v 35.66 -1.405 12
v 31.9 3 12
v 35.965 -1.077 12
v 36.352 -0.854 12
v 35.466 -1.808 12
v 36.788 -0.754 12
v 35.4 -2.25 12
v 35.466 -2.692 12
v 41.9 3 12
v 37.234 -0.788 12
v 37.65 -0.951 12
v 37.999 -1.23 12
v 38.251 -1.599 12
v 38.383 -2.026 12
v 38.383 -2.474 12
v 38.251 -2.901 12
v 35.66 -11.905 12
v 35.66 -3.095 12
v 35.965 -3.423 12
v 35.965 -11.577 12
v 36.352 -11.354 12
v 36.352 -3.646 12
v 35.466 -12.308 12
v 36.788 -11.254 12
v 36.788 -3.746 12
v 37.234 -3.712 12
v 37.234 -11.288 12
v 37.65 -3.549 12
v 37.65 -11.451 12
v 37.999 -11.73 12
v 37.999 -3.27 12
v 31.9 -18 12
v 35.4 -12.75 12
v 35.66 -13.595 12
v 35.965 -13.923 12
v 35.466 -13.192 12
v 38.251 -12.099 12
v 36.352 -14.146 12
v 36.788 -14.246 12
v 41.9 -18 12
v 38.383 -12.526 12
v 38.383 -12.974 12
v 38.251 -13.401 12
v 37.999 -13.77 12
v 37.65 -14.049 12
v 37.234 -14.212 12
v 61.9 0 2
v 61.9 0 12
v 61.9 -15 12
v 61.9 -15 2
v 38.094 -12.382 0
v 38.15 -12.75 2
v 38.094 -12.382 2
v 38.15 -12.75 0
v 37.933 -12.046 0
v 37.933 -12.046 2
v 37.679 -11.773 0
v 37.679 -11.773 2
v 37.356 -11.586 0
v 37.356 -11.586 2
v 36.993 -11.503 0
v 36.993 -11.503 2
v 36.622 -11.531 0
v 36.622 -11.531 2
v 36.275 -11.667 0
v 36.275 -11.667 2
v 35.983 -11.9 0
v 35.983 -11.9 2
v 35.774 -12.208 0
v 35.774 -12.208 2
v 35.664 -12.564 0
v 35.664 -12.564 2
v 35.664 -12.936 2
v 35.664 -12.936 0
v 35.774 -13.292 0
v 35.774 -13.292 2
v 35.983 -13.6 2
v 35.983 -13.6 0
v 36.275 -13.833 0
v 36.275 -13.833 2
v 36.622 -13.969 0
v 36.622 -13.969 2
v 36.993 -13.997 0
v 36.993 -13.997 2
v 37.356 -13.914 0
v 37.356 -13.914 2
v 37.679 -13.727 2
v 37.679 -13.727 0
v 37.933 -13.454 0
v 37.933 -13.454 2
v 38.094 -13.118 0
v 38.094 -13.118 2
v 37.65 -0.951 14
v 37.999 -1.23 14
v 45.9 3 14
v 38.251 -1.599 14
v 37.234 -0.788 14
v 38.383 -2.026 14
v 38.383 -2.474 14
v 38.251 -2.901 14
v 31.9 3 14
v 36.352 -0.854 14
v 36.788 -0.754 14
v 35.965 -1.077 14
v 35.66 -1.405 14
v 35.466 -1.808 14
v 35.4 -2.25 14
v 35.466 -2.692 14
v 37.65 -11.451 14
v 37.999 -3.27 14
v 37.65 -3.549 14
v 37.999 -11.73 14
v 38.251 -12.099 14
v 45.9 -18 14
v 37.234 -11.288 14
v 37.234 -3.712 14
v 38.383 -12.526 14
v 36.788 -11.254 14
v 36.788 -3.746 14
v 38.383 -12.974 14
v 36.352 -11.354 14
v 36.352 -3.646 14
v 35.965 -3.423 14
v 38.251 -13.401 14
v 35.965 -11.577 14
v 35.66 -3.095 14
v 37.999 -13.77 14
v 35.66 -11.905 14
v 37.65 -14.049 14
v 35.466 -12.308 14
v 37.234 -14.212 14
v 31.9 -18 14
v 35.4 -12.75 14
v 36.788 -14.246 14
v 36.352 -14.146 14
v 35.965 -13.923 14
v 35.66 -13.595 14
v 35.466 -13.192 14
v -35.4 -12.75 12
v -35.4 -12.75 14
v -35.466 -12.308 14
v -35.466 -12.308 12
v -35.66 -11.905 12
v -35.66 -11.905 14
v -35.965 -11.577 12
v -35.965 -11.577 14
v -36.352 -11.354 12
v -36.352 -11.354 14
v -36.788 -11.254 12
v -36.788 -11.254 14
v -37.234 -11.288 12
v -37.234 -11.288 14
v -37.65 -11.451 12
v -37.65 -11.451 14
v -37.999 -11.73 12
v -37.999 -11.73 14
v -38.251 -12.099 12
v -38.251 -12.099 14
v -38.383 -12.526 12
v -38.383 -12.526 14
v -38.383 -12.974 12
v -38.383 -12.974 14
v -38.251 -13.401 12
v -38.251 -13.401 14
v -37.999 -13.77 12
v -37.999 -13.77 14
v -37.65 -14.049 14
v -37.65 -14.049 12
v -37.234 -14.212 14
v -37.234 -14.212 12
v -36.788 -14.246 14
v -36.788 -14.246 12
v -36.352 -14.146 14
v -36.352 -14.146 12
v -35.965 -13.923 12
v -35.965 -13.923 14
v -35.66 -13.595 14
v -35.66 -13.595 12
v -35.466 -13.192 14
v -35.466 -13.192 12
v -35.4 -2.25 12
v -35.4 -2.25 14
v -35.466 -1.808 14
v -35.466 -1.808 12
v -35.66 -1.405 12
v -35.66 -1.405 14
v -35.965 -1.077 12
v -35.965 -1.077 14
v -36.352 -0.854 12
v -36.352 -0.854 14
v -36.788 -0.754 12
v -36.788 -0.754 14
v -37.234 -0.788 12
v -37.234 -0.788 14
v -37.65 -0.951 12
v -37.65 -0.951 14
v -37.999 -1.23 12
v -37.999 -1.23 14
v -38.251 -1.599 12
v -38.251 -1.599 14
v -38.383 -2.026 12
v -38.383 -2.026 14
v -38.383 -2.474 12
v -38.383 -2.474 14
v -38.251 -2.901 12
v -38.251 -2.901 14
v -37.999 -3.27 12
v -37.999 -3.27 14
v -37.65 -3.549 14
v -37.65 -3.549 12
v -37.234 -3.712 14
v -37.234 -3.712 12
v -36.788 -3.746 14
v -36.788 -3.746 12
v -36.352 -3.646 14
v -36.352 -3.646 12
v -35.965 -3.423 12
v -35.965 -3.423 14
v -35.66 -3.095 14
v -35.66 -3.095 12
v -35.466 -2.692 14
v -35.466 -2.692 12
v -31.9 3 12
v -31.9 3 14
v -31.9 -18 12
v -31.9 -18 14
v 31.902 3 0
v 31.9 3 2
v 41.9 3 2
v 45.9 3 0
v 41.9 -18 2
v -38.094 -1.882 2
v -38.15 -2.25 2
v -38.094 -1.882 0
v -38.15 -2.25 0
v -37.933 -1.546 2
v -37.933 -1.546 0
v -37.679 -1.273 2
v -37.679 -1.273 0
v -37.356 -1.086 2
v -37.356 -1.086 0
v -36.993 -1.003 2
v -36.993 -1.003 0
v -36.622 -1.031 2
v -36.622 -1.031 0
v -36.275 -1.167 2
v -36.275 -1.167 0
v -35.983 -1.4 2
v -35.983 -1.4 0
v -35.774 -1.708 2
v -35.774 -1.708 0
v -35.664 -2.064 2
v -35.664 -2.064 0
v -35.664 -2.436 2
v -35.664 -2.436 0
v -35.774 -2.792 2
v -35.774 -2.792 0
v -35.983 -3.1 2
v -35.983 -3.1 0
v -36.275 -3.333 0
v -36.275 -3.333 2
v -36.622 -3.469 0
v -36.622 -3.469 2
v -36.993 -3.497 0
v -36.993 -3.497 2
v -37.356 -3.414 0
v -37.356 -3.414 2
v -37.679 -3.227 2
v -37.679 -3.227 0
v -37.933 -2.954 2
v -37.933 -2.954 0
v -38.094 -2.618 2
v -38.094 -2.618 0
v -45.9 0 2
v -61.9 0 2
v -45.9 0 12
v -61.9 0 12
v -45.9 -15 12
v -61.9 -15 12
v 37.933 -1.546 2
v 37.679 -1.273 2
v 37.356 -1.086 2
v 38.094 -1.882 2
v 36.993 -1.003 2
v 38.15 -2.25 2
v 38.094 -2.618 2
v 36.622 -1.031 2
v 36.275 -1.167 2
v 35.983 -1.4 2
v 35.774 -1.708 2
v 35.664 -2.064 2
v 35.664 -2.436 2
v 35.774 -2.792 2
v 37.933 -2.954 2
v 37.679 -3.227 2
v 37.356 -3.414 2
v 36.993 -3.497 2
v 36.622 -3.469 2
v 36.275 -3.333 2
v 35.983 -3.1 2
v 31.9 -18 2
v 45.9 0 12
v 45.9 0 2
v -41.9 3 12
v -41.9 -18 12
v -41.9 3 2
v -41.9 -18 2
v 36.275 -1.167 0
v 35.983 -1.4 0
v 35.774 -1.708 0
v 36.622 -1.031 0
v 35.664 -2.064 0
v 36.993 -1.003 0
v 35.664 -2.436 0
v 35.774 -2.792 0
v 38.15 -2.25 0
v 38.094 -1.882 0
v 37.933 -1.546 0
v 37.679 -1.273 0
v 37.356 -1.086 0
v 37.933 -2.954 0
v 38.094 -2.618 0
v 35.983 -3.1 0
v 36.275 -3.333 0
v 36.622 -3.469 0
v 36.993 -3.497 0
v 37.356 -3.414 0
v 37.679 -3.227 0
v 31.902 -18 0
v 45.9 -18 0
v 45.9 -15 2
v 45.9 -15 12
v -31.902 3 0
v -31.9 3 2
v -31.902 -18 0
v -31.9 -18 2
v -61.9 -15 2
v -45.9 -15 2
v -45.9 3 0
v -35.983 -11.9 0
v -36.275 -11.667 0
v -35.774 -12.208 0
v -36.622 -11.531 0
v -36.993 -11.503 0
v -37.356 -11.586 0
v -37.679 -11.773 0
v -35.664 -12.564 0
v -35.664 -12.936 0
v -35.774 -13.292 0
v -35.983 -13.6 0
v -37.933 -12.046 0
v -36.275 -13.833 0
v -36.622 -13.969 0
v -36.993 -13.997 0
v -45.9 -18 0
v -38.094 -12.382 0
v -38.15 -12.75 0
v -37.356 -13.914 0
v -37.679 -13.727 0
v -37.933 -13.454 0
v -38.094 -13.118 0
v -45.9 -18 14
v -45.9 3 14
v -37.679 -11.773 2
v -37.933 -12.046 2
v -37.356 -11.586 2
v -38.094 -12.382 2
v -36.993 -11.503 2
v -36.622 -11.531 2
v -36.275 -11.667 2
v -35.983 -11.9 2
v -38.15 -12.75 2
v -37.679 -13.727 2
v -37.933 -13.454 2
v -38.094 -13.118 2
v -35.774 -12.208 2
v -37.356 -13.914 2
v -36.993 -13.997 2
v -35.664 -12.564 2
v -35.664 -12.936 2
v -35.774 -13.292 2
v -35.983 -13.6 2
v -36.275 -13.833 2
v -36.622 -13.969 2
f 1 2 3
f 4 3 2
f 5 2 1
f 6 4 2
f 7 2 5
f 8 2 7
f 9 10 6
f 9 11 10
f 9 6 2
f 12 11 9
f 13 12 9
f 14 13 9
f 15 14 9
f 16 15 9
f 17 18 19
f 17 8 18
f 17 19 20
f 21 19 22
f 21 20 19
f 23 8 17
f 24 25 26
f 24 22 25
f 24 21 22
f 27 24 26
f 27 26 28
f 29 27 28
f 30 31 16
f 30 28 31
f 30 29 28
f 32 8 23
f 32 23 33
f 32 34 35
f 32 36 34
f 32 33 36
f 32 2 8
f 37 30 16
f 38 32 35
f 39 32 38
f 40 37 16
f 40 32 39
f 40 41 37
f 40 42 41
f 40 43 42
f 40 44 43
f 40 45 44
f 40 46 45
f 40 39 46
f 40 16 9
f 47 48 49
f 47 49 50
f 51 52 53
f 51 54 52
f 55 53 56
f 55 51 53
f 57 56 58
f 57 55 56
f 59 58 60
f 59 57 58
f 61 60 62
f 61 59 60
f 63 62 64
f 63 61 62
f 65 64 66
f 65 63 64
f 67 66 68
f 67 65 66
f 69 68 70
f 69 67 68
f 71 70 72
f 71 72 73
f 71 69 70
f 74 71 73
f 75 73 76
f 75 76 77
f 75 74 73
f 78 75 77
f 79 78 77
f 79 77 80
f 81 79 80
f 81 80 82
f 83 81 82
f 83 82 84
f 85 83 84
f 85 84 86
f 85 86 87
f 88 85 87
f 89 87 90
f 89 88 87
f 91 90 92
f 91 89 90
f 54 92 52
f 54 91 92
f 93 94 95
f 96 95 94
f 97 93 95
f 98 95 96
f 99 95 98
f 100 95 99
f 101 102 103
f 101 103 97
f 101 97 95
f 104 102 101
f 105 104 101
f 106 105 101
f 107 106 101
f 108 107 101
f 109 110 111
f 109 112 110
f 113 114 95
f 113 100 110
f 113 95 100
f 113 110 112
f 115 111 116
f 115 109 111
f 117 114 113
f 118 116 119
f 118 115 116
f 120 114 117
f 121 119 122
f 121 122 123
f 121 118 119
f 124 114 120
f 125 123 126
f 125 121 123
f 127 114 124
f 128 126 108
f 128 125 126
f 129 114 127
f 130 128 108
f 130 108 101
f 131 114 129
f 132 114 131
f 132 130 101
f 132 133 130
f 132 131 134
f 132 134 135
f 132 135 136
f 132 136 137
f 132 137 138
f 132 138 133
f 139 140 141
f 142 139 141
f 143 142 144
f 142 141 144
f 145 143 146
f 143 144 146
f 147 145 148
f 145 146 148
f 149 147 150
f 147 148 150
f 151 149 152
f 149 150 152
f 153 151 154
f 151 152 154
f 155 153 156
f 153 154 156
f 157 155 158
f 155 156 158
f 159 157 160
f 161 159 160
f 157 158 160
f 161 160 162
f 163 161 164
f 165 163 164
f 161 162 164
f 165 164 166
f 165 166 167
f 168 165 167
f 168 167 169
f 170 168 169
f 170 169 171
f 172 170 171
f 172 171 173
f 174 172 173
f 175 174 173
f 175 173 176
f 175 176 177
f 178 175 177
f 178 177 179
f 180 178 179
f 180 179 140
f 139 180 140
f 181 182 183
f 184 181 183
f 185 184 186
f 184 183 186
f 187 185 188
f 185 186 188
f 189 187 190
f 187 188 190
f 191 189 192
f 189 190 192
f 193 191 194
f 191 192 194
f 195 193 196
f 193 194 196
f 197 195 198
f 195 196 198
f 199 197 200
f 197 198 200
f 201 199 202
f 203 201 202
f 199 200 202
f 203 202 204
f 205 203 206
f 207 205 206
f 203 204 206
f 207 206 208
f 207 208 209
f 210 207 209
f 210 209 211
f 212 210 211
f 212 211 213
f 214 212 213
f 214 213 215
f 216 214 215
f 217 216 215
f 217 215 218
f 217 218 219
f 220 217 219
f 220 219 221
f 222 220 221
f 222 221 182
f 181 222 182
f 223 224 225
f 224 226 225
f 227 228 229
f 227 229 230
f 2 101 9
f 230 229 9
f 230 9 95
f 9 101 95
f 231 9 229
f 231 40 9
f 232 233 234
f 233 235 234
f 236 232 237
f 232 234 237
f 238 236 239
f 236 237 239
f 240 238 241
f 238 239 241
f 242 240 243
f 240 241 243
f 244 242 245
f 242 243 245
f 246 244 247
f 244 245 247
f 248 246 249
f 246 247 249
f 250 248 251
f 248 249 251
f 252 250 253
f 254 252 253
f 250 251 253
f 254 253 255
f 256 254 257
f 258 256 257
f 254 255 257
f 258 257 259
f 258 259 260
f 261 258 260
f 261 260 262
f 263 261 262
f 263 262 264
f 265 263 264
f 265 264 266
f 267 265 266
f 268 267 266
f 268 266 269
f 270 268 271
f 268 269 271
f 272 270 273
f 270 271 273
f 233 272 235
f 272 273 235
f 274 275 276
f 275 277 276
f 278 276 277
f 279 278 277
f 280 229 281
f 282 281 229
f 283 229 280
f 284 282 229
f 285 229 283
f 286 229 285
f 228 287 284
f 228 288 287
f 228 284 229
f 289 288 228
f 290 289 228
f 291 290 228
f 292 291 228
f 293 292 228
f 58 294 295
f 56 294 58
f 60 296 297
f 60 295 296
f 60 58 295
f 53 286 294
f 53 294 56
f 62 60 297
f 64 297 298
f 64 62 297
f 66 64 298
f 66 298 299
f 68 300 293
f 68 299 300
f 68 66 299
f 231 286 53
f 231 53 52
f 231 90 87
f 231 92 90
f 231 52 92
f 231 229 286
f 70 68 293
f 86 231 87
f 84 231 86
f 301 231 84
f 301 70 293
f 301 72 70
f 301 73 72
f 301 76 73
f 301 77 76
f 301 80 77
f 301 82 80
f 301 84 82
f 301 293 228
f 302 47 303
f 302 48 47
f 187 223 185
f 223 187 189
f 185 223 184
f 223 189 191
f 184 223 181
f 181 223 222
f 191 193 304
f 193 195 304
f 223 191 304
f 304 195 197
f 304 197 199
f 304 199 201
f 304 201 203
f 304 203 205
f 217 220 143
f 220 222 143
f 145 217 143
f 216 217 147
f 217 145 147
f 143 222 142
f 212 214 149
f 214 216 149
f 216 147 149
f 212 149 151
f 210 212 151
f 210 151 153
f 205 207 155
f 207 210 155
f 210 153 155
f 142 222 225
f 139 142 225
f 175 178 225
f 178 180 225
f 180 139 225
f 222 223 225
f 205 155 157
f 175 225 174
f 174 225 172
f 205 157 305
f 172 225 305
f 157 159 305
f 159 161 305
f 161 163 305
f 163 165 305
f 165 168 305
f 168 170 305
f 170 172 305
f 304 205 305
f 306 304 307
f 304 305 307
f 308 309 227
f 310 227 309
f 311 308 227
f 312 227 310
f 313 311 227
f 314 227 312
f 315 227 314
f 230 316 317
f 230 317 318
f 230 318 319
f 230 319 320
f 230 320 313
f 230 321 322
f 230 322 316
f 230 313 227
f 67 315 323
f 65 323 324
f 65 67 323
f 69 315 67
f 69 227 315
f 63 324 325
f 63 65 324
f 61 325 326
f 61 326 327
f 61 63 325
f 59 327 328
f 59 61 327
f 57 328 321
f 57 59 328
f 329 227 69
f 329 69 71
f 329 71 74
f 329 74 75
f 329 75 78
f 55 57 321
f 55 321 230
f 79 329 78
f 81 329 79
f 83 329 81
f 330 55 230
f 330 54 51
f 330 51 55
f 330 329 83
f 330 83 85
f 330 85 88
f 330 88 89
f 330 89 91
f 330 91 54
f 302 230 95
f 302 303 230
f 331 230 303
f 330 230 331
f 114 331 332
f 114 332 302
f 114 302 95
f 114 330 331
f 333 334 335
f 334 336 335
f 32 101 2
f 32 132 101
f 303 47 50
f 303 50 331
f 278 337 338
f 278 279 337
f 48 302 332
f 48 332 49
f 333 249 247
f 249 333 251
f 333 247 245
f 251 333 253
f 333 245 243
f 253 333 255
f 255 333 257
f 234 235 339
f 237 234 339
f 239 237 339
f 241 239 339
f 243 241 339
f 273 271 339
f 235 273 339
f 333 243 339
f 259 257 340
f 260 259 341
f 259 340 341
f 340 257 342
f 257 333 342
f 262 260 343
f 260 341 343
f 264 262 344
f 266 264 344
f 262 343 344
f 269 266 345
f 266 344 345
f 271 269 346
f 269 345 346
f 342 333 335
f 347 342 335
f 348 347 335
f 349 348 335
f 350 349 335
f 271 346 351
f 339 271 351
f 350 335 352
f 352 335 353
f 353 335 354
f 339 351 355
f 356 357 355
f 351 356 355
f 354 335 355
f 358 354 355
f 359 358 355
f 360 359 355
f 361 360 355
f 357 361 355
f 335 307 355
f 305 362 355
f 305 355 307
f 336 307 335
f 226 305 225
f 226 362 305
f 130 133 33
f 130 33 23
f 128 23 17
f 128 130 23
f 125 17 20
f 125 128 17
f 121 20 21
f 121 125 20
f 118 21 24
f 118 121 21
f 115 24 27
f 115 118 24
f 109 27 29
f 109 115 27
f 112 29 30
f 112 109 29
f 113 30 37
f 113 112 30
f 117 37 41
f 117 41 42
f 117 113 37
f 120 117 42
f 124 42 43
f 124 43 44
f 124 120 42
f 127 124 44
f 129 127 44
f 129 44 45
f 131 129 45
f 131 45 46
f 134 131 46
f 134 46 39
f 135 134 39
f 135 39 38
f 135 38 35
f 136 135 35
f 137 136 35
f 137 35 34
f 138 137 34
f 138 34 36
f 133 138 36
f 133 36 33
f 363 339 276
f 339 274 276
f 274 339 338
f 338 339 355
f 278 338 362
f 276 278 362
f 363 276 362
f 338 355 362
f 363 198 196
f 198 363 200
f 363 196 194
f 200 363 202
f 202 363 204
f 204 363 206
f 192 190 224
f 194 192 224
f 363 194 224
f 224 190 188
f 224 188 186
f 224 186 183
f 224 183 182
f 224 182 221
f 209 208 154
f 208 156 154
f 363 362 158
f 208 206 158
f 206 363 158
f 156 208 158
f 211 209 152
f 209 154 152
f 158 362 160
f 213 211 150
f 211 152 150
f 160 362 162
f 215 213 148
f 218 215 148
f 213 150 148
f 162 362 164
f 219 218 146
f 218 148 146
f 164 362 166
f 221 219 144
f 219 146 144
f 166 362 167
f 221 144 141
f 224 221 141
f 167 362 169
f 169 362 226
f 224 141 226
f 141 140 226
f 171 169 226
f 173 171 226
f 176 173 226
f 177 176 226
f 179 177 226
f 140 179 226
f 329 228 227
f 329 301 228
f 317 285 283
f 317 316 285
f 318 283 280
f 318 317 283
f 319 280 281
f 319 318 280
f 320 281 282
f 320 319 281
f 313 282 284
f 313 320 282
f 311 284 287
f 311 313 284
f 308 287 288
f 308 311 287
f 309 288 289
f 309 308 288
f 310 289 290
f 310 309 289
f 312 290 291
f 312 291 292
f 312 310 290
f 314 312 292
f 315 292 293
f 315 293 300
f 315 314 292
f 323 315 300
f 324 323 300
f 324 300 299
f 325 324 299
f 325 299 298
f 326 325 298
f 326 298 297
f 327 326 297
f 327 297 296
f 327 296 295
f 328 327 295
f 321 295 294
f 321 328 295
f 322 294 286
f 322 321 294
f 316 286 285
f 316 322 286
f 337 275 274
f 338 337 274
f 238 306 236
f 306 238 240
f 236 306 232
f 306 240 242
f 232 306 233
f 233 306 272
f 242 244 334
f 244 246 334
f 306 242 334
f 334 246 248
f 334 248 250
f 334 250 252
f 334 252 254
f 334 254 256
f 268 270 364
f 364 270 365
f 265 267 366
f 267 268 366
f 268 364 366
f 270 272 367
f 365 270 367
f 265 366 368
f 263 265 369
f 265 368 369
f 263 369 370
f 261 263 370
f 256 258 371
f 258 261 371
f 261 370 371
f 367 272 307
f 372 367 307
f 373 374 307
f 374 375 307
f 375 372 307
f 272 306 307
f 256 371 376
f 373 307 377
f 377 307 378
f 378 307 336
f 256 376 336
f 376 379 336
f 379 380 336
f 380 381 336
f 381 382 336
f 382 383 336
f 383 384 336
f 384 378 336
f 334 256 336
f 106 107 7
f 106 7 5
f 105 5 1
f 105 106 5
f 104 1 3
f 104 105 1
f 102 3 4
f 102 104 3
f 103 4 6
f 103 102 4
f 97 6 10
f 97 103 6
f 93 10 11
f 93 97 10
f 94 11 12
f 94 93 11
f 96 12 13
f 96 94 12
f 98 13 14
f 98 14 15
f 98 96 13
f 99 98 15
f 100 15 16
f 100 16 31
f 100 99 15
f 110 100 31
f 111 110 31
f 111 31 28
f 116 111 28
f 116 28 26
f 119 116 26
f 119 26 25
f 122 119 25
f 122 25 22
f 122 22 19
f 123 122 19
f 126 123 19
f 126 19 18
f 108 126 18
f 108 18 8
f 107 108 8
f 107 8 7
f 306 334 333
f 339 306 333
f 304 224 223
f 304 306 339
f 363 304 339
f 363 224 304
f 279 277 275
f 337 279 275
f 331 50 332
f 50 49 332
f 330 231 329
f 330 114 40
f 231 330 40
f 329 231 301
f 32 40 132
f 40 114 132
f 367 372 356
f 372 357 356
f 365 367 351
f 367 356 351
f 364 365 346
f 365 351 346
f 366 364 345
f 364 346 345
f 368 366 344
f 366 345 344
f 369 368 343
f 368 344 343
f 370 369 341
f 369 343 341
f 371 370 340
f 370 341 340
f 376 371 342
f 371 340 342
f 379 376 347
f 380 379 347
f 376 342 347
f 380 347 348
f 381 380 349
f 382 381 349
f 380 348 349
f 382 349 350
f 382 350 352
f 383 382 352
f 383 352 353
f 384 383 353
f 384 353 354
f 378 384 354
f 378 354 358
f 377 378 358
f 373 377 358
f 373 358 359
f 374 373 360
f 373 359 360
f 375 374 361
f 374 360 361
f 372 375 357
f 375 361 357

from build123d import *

# Parameters (mm, degrees)
F1_DEPTH       = 15
F3_DEPTH       = 3
F5_DEPTH       = 3
F7_D           = 2.5
F7_CBORE_D     = 3
F7_CBORE_DEPTH = 10


with BuildPart() as f1:
    # F0 (on Front) → F1 (new body)
    with BuildSketch(Plane.XZ):
        Polygon((-45.899762, 0), (-31.902481, 0), (-31.899762, 2), (-41.899762, 2), (-41.899762, 12), (-31.899762, 12), (-31.899762, 14), (-45.899762, 14), (-45.899762, 12), (-61.899762, 12), (-61.899762, 2), (-45.899762, 2), align=None)
    extrude(amount=F1_DEPTH)

    # F2 (on face) → F3 (join)
    with BuildSketch(Plane.XZ.offset(15)):
        Polygon((-45.899762, 14), (-45.899762, 12), (-45.899762, 2), (-45.899762, 0), (-31.902481, 0), (-31.899762, 2), (-41.899762, 2), (-41.899762, 12), (-31.899762, 12), (-31.899762, 14), align=None)
    extrude(amount=F3_DEPTH)

    # F4 (on face) → F5 (join)
    with BuildSketch(Plane(origin=(0, 0, 0), x_dir=(-1, 0, 0), z_dir=(0, 1, 0))):
        Polygon((45.899762, 2), (45.899762, 12), (45.899762, 14), (31.899762, 14), (31.899762, 12), (41.899762, 12), (41.899762, 2), (31.899762, 2), (31.902481, 0), (45.899762, 0), align=None)
    extrude(amount=F5_DEPTH)

    # F7 (through all)
    with Locations(Plane.XY.offset(14)):
        with Locations((-36.899762, -2.25), (-36.899762, -12.75)):
            CounterBoreHole(F7_D / 2, F7_CBORE_D / 2, F7_CBORE_DEPTH)


with BuildPart() as f8_1:
    # F8: instance of F1
    add(f1.part.mirror(Plane.YZ))


solid = Compound([f1.part, f8_1.part])
